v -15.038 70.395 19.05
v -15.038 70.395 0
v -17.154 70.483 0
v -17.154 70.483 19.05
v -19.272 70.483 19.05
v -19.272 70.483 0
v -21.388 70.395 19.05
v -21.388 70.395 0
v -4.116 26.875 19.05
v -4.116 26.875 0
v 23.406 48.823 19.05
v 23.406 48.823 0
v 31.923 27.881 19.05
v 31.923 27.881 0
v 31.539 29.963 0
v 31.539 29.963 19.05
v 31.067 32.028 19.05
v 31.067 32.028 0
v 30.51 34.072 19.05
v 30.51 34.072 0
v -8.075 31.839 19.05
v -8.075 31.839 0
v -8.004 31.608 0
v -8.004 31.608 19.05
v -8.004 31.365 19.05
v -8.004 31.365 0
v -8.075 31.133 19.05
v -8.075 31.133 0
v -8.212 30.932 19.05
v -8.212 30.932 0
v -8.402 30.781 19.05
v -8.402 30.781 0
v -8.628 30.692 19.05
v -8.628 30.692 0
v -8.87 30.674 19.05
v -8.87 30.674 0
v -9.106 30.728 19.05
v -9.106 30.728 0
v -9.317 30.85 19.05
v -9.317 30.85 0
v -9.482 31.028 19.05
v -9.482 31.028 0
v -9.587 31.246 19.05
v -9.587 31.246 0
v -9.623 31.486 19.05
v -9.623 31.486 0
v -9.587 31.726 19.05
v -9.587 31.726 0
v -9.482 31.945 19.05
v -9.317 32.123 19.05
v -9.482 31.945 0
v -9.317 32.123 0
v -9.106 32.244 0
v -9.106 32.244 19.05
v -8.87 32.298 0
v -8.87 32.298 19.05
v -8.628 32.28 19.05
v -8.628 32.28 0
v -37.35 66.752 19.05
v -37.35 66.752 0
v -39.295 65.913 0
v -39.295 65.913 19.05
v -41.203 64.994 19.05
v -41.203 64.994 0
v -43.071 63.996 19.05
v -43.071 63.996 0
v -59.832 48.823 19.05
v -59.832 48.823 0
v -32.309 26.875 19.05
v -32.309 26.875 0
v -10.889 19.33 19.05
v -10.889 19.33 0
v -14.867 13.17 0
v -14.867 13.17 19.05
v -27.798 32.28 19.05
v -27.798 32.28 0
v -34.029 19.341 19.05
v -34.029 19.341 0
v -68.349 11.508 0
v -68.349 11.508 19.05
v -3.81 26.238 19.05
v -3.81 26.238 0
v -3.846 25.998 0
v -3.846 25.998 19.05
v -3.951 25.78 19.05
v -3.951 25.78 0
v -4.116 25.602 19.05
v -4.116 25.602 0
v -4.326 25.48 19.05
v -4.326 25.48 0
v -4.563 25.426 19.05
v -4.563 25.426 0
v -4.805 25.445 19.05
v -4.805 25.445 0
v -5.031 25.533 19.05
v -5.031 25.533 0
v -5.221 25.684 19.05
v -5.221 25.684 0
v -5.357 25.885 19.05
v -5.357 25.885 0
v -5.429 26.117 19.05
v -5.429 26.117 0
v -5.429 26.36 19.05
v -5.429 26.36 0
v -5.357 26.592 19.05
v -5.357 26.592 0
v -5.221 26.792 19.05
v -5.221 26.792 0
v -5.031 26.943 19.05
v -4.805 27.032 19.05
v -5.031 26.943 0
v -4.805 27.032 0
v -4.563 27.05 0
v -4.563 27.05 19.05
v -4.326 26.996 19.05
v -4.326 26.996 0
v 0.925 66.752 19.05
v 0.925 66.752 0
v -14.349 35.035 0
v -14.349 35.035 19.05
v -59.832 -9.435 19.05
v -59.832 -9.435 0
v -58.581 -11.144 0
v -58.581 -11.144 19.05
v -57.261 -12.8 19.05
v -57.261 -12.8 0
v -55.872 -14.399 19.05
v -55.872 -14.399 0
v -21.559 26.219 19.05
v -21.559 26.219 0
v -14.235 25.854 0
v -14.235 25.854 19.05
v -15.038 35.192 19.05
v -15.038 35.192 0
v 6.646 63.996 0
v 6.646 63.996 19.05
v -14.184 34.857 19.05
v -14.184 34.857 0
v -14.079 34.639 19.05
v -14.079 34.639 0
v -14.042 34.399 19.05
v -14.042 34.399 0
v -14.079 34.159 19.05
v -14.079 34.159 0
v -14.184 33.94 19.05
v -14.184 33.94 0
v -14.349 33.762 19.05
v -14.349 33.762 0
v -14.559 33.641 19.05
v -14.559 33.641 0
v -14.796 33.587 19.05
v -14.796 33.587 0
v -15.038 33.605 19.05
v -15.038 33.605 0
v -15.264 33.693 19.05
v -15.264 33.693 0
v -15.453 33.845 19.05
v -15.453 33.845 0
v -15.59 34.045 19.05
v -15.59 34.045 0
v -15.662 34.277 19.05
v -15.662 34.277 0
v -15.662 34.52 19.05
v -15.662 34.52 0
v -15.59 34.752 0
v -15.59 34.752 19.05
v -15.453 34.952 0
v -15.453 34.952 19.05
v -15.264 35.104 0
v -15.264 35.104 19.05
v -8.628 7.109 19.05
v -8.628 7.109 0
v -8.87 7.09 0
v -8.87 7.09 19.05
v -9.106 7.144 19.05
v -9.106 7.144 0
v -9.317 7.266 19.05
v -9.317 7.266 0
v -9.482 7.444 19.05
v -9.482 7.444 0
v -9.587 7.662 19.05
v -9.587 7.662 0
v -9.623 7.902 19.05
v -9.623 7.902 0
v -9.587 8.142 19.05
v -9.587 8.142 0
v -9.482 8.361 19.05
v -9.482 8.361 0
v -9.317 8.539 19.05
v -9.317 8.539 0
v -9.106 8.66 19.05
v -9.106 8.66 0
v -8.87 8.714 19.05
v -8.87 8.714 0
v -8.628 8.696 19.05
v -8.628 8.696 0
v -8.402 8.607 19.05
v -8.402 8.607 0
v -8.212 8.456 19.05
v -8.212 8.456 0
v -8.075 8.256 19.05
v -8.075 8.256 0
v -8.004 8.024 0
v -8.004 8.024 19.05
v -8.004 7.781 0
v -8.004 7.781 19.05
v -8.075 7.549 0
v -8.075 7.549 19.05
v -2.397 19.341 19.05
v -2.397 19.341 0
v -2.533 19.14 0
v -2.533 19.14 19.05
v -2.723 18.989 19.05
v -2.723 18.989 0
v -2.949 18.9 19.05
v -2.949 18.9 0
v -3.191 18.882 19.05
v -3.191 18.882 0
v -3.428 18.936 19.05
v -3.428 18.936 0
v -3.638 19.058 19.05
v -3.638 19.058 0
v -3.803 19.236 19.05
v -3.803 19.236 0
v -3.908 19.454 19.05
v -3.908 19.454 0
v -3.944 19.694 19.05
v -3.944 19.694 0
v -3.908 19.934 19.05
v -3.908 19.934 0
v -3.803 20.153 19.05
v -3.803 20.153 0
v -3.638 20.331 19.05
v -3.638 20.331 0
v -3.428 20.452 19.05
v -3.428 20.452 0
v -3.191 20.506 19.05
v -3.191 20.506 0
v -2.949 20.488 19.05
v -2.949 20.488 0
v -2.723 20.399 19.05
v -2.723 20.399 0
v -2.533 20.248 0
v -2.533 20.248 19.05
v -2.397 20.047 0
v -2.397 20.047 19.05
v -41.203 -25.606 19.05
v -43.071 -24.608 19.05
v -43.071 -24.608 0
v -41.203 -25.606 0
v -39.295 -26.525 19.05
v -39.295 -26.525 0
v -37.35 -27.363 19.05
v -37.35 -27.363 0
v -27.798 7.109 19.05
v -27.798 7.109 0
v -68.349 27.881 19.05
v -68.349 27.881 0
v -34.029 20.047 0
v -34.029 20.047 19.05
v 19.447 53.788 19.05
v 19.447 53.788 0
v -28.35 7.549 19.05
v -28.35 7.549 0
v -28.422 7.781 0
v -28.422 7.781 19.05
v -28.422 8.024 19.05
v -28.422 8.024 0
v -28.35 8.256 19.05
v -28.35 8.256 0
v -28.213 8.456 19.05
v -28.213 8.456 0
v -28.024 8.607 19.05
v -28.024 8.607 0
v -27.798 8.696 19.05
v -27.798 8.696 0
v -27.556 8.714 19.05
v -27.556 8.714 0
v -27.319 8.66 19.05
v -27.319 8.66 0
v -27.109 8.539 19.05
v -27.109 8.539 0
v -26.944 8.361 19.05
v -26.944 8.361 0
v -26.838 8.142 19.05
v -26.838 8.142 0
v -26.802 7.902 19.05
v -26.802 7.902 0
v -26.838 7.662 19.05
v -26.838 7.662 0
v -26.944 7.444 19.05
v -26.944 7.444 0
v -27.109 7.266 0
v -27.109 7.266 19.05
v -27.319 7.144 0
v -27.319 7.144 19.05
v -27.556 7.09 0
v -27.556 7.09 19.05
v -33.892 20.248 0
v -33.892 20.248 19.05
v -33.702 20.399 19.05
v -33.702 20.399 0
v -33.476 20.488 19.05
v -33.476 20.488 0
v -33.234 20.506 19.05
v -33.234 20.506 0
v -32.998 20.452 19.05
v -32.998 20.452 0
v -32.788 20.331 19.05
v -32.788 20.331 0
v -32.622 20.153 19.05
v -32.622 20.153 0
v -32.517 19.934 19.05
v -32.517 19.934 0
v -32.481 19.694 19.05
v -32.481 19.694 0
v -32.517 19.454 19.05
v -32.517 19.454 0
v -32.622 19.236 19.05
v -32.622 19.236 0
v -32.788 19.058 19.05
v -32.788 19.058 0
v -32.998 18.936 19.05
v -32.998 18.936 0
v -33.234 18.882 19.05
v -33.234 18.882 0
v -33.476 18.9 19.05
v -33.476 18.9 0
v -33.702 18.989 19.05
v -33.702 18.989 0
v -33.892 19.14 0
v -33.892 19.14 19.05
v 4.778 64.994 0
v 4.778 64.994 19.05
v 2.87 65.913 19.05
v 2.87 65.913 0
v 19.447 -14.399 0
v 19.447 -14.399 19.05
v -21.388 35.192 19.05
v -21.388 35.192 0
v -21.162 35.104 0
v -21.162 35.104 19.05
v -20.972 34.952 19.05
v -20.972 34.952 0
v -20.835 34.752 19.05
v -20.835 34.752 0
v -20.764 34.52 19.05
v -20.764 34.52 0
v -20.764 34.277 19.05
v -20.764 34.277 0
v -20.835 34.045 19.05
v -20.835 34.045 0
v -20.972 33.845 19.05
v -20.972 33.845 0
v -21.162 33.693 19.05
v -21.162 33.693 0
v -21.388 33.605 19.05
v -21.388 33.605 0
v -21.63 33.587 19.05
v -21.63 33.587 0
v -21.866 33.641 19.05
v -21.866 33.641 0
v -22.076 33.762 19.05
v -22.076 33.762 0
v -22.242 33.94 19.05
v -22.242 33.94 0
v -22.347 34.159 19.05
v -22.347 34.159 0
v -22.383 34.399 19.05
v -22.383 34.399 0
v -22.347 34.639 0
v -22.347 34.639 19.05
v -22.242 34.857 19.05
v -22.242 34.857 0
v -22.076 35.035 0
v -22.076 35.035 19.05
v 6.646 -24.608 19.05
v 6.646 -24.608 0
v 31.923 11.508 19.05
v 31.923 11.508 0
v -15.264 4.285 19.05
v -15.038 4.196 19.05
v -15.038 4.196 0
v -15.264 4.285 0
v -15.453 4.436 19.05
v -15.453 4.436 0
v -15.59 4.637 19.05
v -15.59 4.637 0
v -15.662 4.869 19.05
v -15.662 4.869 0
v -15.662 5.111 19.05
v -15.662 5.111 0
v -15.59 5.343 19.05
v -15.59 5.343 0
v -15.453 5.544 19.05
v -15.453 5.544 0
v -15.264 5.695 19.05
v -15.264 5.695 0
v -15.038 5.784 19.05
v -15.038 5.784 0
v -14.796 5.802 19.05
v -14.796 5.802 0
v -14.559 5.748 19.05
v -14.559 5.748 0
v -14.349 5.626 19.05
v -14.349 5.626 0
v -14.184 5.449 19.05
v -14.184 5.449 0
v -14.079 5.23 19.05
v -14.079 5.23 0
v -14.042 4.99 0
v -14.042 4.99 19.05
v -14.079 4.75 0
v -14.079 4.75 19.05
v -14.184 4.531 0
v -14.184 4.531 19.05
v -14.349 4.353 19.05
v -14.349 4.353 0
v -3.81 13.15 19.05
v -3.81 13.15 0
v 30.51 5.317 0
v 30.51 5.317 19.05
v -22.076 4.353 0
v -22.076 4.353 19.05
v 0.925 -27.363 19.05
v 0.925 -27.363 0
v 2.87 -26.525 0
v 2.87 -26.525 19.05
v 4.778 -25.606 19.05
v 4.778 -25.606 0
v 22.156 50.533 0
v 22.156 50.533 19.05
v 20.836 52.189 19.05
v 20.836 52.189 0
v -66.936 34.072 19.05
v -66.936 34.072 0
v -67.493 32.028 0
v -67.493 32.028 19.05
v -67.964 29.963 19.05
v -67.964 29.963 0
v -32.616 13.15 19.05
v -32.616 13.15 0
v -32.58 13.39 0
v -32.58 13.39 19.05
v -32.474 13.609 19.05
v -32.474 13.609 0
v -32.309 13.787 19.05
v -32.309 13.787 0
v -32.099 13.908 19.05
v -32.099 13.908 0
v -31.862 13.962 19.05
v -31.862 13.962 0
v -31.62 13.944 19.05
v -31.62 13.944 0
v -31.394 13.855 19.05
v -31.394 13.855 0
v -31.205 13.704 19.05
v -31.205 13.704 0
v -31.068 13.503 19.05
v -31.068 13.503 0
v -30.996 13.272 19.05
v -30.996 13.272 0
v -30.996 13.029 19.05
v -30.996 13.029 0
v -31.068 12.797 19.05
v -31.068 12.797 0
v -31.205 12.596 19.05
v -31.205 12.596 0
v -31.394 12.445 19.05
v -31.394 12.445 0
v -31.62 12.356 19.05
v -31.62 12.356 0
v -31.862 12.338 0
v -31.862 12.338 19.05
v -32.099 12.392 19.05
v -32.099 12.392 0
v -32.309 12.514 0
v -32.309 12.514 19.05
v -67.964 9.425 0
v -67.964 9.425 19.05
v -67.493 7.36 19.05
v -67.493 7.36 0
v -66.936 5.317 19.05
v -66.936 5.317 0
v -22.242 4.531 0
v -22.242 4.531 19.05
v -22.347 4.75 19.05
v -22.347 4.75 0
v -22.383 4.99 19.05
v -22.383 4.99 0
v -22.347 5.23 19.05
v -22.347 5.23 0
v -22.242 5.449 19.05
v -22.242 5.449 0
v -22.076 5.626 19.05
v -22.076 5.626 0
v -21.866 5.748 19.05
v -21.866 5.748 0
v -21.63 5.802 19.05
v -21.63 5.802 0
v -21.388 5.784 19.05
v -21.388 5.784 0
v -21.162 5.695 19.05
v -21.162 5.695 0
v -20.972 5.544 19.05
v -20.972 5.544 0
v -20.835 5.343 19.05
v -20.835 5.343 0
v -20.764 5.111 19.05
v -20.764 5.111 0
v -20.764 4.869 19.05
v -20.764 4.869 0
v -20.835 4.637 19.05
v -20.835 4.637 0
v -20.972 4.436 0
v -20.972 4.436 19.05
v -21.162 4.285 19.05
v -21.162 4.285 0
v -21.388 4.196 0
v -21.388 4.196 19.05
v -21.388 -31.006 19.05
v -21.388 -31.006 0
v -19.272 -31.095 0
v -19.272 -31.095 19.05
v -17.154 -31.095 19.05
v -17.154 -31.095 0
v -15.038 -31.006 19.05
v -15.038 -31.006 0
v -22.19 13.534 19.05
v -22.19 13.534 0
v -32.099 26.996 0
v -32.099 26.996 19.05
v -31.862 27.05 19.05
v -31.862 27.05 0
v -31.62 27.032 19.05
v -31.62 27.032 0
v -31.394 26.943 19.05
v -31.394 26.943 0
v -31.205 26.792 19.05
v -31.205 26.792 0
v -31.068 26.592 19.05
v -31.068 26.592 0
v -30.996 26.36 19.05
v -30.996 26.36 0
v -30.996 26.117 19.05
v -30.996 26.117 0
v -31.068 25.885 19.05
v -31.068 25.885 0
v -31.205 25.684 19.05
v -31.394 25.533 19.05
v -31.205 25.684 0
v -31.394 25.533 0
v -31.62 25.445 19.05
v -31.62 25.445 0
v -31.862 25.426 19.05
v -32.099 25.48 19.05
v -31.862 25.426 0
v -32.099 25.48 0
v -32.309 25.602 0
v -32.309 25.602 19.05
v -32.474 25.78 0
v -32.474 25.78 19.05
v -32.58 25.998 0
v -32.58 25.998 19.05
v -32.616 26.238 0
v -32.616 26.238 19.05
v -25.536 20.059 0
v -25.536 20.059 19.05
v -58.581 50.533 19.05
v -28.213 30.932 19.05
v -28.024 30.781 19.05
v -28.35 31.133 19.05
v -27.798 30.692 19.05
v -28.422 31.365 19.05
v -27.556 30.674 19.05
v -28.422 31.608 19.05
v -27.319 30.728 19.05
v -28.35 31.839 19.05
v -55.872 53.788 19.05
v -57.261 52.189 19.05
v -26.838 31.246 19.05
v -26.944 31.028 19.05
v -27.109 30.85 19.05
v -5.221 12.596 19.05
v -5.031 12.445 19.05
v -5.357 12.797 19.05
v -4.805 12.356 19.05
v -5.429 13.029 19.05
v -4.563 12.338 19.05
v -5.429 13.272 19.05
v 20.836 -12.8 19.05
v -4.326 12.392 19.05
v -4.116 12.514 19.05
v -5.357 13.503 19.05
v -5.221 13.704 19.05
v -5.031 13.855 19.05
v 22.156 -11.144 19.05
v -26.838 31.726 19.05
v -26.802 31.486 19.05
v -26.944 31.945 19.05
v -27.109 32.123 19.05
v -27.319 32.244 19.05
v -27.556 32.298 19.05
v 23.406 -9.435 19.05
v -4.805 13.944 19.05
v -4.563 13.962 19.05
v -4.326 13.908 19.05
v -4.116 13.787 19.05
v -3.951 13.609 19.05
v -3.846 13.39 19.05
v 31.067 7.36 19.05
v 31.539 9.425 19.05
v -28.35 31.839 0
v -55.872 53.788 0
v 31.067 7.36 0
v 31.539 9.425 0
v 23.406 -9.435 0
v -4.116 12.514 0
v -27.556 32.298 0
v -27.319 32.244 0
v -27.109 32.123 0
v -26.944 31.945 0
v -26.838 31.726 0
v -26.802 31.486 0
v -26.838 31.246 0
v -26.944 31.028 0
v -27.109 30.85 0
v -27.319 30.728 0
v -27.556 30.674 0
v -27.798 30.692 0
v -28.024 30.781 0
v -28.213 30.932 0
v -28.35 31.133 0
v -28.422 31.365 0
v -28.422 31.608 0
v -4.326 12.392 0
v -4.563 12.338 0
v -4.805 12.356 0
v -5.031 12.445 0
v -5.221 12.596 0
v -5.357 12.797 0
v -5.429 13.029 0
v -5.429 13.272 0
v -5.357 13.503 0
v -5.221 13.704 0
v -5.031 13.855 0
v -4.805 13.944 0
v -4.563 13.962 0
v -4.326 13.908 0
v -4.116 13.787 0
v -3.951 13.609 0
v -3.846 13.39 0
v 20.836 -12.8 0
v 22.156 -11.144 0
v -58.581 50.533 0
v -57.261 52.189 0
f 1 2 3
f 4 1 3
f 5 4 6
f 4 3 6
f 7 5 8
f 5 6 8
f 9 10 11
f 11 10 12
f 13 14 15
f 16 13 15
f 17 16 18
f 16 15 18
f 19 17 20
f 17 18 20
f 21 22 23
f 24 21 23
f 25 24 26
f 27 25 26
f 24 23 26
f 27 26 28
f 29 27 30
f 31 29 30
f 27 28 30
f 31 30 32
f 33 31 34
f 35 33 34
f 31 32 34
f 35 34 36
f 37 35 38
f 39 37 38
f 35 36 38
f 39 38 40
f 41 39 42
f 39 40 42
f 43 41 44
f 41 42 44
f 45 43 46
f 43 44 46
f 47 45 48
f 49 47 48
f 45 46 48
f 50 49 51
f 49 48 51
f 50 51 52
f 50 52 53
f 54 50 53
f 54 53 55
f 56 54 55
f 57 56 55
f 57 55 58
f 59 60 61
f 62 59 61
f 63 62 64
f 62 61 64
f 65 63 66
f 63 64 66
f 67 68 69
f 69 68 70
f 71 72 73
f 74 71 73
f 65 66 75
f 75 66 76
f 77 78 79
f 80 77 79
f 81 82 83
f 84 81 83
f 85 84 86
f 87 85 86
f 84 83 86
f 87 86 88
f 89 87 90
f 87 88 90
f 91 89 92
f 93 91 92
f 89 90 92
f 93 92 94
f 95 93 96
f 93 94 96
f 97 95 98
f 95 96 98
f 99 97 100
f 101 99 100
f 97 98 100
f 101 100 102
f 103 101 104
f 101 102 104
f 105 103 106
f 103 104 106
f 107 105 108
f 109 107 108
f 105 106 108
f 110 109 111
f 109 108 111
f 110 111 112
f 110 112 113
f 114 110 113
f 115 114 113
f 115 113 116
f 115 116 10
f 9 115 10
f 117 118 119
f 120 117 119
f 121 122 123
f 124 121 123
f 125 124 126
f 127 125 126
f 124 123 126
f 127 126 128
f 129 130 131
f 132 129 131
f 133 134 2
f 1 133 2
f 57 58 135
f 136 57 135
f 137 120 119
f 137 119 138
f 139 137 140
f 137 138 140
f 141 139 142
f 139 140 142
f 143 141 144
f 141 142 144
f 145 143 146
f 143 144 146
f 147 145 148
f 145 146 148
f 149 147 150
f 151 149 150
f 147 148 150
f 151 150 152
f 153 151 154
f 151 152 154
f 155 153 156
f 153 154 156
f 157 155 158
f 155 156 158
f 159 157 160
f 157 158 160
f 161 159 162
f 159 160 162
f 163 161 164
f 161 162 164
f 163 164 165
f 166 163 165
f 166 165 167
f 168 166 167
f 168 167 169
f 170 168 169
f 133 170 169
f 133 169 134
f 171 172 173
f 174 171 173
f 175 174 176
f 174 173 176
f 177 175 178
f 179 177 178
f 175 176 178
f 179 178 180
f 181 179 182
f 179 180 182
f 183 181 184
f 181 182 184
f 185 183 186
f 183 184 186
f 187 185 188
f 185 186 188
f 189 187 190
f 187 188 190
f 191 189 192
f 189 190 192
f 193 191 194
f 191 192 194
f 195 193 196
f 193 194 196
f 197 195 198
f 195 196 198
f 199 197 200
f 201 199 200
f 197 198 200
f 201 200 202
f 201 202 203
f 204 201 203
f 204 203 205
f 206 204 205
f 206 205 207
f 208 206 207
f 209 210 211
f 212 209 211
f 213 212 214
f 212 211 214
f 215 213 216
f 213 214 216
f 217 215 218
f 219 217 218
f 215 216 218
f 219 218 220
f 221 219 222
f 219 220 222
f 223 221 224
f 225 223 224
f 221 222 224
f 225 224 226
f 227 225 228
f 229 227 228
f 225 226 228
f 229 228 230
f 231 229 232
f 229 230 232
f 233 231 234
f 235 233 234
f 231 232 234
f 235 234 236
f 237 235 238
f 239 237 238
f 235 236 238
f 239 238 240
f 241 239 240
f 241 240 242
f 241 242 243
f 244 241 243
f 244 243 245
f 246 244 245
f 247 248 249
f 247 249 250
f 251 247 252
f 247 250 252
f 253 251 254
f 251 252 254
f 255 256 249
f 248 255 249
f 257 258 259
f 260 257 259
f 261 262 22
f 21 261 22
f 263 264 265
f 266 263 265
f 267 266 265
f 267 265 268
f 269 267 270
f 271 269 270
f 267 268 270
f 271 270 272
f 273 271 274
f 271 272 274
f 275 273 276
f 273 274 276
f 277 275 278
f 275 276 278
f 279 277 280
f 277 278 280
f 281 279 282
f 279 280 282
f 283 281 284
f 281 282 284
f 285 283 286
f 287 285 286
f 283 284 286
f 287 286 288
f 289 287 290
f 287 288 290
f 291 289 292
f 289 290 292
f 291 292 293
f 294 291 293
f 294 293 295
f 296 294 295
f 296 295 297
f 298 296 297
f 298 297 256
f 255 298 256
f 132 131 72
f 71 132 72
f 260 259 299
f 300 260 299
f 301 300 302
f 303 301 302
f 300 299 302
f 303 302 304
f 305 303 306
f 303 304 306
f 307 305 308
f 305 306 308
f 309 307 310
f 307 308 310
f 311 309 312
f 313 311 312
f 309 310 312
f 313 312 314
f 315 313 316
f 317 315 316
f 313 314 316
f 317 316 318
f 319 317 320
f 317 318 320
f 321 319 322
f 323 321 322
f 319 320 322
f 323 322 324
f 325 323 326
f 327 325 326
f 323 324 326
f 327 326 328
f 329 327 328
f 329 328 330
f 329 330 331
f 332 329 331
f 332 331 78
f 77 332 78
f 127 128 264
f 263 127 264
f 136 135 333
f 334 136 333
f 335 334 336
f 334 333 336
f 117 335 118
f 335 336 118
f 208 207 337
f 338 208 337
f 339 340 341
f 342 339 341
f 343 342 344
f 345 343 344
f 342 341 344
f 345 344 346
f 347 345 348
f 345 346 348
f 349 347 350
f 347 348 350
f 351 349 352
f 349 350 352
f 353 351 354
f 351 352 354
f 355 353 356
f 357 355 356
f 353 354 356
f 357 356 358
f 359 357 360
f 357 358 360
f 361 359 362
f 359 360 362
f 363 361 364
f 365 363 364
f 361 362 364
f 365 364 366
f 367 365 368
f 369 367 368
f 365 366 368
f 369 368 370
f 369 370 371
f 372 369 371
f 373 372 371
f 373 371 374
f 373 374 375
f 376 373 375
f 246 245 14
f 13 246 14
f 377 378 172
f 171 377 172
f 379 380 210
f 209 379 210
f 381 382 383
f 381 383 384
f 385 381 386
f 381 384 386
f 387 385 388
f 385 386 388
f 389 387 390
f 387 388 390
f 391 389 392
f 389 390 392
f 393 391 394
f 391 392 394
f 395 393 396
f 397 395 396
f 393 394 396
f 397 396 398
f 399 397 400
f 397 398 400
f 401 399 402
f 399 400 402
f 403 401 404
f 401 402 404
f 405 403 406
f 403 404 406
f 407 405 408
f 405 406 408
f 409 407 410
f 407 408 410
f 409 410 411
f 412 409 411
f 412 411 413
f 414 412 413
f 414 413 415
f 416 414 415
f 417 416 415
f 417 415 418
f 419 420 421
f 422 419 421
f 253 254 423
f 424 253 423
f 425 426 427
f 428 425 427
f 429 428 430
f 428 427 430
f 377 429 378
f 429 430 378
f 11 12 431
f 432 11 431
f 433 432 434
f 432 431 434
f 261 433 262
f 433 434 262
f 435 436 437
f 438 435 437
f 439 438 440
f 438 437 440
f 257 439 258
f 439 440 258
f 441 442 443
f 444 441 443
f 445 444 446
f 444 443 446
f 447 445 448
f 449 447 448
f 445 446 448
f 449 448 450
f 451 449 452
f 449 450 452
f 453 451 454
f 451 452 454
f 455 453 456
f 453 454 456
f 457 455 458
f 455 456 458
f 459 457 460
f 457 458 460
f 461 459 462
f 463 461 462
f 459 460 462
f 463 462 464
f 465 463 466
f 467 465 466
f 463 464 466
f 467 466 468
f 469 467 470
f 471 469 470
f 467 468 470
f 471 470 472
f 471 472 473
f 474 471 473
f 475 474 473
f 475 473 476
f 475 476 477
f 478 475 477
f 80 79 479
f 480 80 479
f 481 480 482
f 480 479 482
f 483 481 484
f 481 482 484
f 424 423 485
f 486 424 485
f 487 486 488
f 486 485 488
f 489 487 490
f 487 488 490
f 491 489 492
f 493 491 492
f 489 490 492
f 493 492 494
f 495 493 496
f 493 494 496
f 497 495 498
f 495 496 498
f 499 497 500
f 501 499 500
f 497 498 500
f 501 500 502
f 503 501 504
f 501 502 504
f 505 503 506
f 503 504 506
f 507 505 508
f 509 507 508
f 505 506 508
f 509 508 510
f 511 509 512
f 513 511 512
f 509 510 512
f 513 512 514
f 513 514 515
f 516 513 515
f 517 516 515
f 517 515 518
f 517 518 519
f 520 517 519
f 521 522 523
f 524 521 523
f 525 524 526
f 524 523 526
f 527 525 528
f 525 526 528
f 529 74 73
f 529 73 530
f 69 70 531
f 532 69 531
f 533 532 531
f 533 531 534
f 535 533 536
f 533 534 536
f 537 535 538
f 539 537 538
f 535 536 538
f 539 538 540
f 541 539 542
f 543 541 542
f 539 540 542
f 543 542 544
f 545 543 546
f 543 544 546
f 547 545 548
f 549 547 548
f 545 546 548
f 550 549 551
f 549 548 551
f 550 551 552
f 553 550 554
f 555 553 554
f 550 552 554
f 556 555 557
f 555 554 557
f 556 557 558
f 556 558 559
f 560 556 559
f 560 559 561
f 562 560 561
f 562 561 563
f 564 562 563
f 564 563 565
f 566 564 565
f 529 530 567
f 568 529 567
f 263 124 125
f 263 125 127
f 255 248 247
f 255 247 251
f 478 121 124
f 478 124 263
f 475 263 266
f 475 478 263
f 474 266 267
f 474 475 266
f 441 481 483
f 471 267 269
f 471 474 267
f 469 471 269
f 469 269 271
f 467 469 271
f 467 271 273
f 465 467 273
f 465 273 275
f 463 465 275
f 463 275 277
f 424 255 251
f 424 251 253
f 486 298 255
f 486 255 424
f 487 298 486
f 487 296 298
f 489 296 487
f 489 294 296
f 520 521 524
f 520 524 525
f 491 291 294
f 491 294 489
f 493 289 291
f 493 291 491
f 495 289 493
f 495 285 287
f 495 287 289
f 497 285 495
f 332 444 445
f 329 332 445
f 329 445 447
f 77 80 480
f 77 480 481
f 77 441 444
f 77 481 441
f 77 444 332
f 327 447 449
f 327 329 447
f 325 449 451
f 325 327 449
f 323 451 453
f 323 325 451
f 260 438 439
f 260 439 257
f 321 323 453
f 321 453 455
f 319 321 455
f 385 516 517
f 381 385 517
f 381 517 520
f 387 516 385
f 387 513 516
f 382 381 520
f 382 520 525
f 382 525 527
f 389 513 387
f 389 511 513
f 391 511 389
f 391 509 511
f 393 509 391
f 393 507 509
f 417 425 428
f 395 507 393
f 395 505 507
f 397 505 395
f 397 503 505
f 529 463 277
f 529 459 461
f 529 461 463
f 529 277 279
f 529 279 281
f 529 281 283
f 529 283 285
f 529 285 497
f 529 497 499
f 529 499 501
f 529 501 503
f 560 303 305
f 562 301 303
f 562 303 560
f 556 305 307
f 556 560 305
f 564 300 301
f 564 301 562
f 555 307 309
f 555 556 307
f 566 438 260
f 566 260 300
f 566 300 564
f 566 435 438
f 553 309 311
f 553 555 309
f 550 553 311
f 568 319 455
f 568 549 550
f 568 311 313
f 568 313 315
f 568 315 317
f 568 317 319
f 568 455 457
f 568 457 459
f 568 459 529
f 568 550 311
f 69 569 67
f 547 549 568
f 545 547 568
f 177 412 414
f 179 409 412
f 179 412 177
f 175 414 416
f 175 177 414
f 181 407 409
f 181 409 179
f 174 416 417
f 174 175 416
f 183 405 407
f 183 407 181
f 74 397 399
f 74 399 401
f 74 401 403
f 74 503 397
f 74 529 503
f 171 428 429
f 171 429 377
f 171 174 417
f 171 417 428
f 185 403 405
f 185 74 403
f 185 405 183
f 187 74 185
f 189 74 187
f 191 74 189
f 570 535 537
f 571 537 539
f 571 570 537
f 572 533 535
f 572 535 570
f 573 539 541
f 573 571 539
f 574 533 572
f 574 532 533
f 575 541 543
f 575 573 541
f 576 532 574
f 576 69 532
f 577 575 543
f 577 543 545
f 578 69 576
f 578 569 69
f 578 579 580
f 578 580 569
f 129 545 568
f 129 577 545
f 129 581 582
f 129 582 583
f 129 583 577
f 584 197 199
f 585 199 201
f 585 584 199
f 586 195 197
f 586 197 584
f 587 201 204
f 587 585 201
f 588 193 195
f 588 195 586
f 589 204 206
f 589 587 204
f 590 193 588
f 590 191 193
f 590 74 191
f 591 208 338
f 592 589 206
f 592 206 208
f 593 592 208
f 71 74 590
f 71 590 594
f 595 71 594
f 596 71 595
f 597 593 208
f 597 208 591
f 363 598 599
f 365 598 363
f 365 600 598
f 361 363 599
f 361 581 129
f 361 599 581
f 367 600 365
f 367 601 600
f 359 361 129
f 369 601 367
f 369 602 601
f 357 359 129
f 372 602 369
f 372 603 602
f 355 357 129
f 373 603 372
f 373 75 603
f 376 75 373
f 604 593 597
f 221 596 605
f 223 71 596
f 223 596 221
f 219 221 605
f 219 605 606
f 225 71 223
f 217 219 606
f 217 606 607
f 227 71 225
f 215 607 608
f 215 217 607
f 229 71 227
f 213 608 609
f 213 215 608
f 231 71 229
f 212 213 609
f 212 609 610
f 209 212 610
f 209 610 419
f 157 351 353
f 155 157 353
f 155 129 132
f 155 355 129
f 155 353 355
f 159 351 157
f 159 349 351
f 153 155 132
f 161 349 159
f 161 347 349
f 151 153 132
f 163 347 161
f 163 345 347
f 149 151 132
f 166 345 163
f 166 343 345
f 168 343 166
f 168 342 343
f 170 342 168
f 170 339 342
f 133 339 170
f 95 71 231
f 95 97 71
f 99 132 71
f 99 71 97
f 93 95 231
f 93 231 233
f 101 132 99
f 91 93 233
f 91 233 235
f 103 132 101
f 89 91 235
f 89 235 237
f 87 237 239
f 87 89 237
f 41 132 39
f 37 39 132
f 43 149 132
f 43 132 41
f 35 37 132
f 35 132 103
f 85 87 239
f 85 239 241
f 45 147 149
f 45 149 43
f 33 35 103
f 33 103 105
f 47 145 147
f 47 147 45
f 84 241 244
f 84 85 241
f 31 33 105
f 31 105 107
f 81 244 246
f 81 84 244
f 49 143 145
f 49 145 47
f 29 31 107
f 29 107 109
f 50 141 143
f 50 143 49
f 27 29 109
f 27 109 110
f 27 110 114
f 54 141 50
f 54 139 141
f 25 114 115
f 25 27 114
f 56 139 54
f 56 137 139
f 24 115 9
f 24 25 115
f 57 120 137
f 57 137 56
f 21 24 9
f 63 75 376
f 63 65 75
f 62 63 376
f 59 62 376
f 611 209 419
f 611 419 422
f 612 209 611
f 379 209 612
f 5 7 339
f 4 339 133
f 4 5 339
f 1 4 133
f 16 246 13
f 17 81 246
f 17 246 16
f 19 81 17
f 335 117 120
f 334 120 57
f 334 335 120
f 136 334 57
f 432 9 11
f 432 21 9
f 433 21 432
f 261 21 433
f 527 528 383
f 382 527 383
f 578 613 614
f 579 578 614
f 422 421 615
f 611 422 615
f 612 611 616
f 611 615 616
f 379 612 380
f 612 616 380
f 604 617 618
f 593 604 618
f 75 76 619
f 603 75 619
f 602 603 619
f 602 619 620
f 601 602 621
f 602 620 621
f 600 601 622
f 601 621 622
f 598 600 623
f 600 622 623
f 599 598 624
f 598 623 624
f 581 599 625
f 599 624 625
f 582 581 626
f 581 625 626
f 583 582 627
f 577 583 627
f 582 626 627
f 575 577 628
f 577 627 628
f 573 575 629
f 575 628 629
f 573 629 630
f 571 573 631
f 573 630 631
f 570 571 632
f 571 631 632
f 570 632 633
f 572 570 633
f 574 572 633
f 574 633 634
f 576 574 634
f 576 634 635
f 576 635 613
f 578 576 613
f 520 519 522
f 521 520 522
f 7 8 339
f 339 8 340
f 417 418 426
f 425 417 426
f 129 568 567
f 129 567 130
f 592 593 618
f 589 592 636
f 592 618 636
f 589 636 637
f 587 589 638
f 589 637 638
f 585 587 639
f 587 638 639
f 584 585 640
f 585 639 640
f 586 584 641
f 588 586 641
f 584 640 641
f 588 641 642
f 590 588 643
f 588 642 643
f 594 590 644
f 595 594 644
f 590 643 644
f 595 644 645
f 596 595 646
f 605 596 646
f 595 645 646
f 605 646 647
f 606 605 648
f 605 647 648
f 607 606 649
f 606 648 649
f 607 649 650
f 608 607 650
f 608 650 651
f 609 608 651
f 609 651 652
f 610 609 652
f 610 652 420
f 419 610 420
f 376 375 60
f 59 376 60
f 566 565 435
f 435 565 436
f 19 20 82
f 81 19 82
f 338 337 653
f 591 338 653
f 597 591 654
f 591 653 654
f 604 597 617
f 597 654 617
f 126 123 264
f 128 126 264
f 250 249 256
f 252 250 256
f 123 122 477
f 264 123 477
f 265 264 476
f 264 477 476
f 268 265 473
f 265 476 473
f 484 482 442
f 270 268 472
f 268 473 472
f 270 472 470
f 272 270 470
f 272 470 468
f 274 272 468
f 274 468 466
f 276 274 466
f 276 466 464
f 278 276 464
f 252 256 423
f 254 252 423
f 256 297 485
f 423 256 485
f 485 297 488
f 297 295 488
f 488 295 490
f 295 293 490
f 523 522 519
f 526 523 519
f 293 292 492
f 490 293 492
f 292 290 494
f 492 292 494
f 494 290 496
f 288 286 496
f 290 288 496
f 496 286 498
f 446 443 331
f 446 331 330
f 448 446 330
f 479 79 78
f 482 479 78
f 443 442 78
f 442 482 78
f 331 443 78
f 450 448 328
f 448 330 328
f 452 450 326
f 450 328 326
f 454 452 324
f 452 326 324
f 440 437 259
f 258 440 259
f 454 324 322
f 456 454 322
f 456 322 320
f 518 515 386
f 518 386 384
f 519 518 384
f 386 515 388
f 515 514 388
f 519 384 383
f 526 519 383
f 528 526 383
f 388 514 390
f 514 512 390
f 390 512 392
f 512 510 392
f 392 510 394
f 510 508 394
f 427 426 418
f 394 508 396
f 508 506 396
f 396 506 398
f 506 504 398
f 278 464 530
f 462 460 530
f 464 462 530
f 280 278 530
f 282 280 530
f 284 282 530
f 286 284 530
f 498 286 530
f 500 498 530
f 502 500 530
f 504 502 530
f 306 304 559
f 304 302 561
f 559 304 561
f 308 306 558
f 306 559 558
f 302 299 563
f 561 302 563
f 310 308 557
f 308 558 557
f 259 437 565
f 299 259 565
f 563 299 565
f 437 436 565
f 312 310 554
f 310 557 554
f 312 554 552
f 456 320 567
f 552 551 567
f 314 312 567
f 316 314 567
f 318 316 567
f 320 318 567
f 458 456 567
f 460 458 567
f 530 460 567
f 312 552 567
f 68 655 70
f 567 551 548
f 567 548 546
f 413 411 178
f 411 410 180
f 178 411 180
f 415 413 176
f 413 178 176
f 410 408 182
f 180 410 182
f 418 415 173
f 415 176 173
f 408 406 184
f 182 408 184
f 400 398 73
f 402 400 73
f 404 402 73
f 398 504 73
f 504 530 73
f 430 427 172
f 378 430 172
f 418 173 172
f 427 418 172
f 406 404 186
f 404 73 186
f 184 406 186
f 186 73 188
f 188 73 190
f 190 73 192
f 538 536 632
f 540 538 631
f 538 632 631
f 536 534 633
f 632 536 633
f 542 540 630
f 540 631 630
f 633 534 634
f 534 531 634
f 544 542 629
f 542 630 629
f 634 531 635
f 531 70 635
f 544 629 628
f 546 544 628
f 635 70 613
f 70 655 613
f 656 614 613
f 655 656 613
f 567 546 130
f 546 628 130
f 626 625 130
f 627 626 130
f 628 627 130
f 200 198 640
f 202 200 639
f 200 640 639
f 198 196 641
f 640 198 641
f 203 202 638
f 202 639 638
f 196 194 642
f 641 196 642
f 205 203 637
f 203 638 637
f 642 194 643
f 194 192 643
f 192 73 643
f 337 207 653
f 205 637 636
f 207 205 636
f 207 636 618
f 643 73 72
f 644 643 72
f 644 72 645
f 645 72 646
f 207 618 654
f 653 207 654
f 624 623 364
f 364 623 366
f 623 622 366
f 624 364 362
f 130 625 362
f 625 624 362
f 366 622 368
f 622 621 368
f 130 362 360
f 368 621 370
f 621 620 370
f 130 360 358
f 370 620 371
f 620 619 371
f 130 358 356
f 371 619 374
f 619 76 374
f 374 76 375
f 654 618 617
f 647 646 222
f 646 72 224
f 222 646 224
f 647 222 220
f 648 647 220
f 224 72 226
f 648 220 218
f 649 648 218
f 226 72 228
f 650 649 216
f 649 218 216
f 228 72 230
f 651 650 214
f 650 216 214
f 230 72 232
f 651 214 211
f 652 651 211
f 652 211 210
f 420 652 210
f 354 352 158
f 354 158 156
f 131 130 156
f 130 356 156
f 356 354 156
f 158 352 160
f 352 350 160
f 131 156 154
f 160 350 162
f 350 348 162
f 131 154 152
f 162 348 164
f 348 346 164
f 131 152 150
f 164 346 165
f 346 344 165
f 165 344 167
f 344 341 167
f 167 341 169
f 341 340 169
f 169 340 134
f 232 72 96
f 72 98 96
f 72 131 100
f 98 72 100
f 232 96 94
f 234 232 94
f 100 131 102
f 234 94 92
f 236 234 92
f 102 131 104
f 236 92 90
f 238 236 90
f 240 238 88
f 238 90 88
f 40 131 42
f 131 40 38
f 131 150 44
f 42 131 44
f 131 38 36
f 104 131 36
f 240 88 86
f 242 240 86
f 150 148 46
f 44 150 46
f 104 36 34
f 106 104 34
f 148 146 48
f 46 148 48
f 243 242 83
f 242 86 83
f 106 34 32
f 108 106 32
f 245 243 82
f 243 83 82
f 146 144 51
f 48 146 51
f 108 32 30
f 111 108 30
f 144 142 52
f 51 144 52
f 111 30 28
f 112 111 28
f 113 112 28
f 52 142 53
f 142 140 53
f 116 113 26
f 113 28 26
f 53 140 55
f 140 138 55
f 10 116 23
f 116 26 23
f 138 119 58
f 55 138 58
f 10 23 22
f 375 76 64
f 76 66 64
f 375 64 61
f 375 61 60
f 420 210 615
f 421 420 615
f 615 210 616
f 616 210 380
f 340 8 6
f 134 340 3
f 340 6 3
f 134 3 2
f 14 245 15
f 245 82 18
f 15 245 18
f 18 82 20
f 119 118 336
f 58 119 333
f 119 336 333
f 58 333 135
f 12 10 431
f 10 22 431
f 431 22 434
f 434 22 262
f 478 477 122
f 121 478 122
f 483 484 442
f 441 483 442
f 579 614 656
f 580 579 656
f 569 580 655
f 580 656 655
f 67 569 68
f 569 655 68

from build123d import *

# Parameters (mm, degrees)
BOSS_EXTRUDE1_DEPTH = 19.05


with BuildPart() as part:
    # Sketch1 → Boss-Extrude1 (new body)
    with BuildSketch(Plane.XY):
        with BuildLine():
            Line((-68.348679847, 27.880791406), (-34.028682265, 20.047475917))
            ThreePointArc((-34.028682265, 20.047475917), (-32.480984204, 19.694223934), (-34.028682265, 19.340971952))
            Line((-34.028682265, 19.340971952), (-68.348679847, 11.507656462))
            ThreePointArc((-68.348679847, 11.507656462), (-67.739001659, 8.390160489), (-66.935671916, 5.31686422))
            Line((-66.935671916, 5.31686422), (-32.615674334, 13.150179709))
            ThreePointArc((-32.615674334, 13.150179709), (-31.067976273, 13.503431692), (-32.309133752, 12.513641632))
            Line((-32.309133752, 12.513641632), (-59.831634906, -9.434820634))
            ThreePointArc((-59.831634906, -9.434820634), (-57.92970303, -11.979058), (-55.872474664, -14.399450548))
            Line((-55.872474664, -14.399450548), (-28.34997351, 7.549011718))
            ThreePointArc((-28.34997351, 7.549011718), (-27.108816032, 8.538801778), (-27.797606467, 7.1085137))
            Line((-27.797606467, 7.1085137), (-43.071442298, -24.60793321))
            ThreePointArc((-43.071442298, -24.60793321), (-40.253957668, -26.074994555), (-37.350289987, -27.363094953))
            Line((-37.350289987, -27.363094953), (-22.076454156, 4.353351957))
            ThreePointArc((-22.076454156, 4.353351957), (-21.38766372, 5.783640035), (-21.38766372, 4.196140035))
            Line((-21.38766372, 4.196140035), (-21.38766372, -31.006460233))
            ThreePointArc((-21.38766372, -31.006460233), (-18.21266372, -31.105776066), (-15.03766372, -31.006460233))
            Line((-15.03766372, -31.006460233), (-15.03766372, 4.196140035))
            ThreePointArc((-15.03766372, 4.196140035), (-15.03766372, 5.783640035), (-14.348873285, 4.353351957))
            Line((-14.348873285, 4.353351957), (0.924962546, -27.363094953))
            ThreePointArc((0.924962546, -27.363094953), (3.828630227, -26.074994555), (6.646114857, -24.60793321))
            Line((6.646114857, -24.60793321), (-8.627720973, 7.1085137))
            ThreePointArc((-8.627720973, 7.1085137), (-9.316511409, 8.538801778), (-8.075353931, 7.549011718))
            Line((-8.075353931, 7.549011718), (19.447147223, -14.399450548))
            ThreePointArc((19.447147223, -14.399450548), (21.504375589, -11.979058), (23.406307465, -9.434820634))
            Line((23.406307465, -9.434820634), (-4.116193689, 12.513641632))
            ThreePointArc((-4.116193689, 12.513641632), (-5.357351167, 13.503431692), (-3.809653107, 13.150179709))
            Line((-3.809653107, 13.150179709), (30.510344475, 5.31686422))
            ThreePointArc((30.510344475, 5.31686422), (31.313674218, 8.390160489), (31.923352406, 11.507656462))
            Line((31.923352406, 11.507656462), (-2.396645176, 19.340971952))
            ThreePointArc((-2.396645176, 19.340971952), (-3.944343237, 19.694223934), (-2.396645176, 20.047475917))
            Line((-2.396645176, 20.047475917), (31.923352406, 27.880791406))
            ThreePointArc((31.923352406, 27.880791406), (31.313674218, 30.998287379), (30.510344475, 34.071583649))
            Line((30.510344475, 34.071583649), (-3.809653107, 26.238268159))
            ThreePointArc((-3.809653107, 26.238268159), (-5.357351167, 25.885016177), (-4.116193689, 26.874806237))
            Line((-4.116193689, 26.874806237), (23.406307465, 48.823268503))
            ThreePointArc((23.406307465, 48.823268503), (21.504375589, 51.367505869), (19.447147223, 53.787898417))
            Line((19.447147223, 53.787898417), (-8.075353931, 31.839436151))
            ThreePointArc((-8.075353931, 31.839436151), (-9.316511409, 30.84964609), (-8.627720973, 32.279934168))
            Line((-8.627720973, 32.279934168), (6.646114857, 63.996381078))
            ThreePointArc((6.646114857, 63.996381078), (3.828630227, 65.463442424), (0.924962546, 66.751542822))
            Line((0.924962546, 66.751542822), (-14.348873285, 35.035095912))
            ThreePointArc((-14.348873285, 35.035095912), (-15.03766372, 33.604807834), (-15.03766372, 35.192307834))
            Line((-15.03766372, 35.192307834), (-15.03766372, 70.394908101))
            ThreePointArc((-15.03766372, 70.394908101), (-18.21266372, 70.494223934), (-21.38766372, 70.394908101))
            Line((-21.38766372, 70.394908101), (-21.38766372, 35.192307834))
            ThreePointArc((-21.38766372, 35.192307834), (-21.38766372, 33.604807834), (-22.076454156, 35.035095912))
            Line((-22.076454156, 35.035095912), (-37.350289987, 66.751542822))
            ThreePointArc((-37.350289987, 66.751542822), (-40.253957668, 65.463442424), (-43.071442298, 63.996381078))
            Line((-43.071442298, 63.996381078), (-27.797606467, 32.279934168))
            ThreePointArc((-27.797606467, 32.279934168), (-27.108816032, 30.84964609), (-28.34997351, 31.839436151))
            Line((-28.34997351, 31.839436151), (-55.872474664, 53.787898417))
            ThreePointArc((-55.872474664, 53.787898417), (-57.92970303, 51.367505869), (-59.831634906, 48.823268503))
            Line((-59.831634906, 48.823268503), (-32.309133752, 26.874806237))
            ThreePointArc((-32.309133752, 26.874806237), (-31.067976273, 25.885016177), (-32.615674334, 26.238268159))
            Line((-32.615674334, 26.238268159), (-66.935671916, 34.071583649))
            ThreePointArc((-66.935671916, 34.071583649), (-67.739001659, 30.998287379), (-68.348679847, 27.880791406))
        make_face()
        Polygon((-10.889375563, 19.329828678), (-14.866595191, 13.169872723), (-22.189883348, 13.534267979), (-25.535951877, 20.05861919), (-21.55873225, 26.218575146), (-14.235444093, 25.854179889), align=None, mode=Mode.SUBTRACT)
    extrude(amount=BOSS_EXTRUDE1_DEPTH)


solid = part.part
